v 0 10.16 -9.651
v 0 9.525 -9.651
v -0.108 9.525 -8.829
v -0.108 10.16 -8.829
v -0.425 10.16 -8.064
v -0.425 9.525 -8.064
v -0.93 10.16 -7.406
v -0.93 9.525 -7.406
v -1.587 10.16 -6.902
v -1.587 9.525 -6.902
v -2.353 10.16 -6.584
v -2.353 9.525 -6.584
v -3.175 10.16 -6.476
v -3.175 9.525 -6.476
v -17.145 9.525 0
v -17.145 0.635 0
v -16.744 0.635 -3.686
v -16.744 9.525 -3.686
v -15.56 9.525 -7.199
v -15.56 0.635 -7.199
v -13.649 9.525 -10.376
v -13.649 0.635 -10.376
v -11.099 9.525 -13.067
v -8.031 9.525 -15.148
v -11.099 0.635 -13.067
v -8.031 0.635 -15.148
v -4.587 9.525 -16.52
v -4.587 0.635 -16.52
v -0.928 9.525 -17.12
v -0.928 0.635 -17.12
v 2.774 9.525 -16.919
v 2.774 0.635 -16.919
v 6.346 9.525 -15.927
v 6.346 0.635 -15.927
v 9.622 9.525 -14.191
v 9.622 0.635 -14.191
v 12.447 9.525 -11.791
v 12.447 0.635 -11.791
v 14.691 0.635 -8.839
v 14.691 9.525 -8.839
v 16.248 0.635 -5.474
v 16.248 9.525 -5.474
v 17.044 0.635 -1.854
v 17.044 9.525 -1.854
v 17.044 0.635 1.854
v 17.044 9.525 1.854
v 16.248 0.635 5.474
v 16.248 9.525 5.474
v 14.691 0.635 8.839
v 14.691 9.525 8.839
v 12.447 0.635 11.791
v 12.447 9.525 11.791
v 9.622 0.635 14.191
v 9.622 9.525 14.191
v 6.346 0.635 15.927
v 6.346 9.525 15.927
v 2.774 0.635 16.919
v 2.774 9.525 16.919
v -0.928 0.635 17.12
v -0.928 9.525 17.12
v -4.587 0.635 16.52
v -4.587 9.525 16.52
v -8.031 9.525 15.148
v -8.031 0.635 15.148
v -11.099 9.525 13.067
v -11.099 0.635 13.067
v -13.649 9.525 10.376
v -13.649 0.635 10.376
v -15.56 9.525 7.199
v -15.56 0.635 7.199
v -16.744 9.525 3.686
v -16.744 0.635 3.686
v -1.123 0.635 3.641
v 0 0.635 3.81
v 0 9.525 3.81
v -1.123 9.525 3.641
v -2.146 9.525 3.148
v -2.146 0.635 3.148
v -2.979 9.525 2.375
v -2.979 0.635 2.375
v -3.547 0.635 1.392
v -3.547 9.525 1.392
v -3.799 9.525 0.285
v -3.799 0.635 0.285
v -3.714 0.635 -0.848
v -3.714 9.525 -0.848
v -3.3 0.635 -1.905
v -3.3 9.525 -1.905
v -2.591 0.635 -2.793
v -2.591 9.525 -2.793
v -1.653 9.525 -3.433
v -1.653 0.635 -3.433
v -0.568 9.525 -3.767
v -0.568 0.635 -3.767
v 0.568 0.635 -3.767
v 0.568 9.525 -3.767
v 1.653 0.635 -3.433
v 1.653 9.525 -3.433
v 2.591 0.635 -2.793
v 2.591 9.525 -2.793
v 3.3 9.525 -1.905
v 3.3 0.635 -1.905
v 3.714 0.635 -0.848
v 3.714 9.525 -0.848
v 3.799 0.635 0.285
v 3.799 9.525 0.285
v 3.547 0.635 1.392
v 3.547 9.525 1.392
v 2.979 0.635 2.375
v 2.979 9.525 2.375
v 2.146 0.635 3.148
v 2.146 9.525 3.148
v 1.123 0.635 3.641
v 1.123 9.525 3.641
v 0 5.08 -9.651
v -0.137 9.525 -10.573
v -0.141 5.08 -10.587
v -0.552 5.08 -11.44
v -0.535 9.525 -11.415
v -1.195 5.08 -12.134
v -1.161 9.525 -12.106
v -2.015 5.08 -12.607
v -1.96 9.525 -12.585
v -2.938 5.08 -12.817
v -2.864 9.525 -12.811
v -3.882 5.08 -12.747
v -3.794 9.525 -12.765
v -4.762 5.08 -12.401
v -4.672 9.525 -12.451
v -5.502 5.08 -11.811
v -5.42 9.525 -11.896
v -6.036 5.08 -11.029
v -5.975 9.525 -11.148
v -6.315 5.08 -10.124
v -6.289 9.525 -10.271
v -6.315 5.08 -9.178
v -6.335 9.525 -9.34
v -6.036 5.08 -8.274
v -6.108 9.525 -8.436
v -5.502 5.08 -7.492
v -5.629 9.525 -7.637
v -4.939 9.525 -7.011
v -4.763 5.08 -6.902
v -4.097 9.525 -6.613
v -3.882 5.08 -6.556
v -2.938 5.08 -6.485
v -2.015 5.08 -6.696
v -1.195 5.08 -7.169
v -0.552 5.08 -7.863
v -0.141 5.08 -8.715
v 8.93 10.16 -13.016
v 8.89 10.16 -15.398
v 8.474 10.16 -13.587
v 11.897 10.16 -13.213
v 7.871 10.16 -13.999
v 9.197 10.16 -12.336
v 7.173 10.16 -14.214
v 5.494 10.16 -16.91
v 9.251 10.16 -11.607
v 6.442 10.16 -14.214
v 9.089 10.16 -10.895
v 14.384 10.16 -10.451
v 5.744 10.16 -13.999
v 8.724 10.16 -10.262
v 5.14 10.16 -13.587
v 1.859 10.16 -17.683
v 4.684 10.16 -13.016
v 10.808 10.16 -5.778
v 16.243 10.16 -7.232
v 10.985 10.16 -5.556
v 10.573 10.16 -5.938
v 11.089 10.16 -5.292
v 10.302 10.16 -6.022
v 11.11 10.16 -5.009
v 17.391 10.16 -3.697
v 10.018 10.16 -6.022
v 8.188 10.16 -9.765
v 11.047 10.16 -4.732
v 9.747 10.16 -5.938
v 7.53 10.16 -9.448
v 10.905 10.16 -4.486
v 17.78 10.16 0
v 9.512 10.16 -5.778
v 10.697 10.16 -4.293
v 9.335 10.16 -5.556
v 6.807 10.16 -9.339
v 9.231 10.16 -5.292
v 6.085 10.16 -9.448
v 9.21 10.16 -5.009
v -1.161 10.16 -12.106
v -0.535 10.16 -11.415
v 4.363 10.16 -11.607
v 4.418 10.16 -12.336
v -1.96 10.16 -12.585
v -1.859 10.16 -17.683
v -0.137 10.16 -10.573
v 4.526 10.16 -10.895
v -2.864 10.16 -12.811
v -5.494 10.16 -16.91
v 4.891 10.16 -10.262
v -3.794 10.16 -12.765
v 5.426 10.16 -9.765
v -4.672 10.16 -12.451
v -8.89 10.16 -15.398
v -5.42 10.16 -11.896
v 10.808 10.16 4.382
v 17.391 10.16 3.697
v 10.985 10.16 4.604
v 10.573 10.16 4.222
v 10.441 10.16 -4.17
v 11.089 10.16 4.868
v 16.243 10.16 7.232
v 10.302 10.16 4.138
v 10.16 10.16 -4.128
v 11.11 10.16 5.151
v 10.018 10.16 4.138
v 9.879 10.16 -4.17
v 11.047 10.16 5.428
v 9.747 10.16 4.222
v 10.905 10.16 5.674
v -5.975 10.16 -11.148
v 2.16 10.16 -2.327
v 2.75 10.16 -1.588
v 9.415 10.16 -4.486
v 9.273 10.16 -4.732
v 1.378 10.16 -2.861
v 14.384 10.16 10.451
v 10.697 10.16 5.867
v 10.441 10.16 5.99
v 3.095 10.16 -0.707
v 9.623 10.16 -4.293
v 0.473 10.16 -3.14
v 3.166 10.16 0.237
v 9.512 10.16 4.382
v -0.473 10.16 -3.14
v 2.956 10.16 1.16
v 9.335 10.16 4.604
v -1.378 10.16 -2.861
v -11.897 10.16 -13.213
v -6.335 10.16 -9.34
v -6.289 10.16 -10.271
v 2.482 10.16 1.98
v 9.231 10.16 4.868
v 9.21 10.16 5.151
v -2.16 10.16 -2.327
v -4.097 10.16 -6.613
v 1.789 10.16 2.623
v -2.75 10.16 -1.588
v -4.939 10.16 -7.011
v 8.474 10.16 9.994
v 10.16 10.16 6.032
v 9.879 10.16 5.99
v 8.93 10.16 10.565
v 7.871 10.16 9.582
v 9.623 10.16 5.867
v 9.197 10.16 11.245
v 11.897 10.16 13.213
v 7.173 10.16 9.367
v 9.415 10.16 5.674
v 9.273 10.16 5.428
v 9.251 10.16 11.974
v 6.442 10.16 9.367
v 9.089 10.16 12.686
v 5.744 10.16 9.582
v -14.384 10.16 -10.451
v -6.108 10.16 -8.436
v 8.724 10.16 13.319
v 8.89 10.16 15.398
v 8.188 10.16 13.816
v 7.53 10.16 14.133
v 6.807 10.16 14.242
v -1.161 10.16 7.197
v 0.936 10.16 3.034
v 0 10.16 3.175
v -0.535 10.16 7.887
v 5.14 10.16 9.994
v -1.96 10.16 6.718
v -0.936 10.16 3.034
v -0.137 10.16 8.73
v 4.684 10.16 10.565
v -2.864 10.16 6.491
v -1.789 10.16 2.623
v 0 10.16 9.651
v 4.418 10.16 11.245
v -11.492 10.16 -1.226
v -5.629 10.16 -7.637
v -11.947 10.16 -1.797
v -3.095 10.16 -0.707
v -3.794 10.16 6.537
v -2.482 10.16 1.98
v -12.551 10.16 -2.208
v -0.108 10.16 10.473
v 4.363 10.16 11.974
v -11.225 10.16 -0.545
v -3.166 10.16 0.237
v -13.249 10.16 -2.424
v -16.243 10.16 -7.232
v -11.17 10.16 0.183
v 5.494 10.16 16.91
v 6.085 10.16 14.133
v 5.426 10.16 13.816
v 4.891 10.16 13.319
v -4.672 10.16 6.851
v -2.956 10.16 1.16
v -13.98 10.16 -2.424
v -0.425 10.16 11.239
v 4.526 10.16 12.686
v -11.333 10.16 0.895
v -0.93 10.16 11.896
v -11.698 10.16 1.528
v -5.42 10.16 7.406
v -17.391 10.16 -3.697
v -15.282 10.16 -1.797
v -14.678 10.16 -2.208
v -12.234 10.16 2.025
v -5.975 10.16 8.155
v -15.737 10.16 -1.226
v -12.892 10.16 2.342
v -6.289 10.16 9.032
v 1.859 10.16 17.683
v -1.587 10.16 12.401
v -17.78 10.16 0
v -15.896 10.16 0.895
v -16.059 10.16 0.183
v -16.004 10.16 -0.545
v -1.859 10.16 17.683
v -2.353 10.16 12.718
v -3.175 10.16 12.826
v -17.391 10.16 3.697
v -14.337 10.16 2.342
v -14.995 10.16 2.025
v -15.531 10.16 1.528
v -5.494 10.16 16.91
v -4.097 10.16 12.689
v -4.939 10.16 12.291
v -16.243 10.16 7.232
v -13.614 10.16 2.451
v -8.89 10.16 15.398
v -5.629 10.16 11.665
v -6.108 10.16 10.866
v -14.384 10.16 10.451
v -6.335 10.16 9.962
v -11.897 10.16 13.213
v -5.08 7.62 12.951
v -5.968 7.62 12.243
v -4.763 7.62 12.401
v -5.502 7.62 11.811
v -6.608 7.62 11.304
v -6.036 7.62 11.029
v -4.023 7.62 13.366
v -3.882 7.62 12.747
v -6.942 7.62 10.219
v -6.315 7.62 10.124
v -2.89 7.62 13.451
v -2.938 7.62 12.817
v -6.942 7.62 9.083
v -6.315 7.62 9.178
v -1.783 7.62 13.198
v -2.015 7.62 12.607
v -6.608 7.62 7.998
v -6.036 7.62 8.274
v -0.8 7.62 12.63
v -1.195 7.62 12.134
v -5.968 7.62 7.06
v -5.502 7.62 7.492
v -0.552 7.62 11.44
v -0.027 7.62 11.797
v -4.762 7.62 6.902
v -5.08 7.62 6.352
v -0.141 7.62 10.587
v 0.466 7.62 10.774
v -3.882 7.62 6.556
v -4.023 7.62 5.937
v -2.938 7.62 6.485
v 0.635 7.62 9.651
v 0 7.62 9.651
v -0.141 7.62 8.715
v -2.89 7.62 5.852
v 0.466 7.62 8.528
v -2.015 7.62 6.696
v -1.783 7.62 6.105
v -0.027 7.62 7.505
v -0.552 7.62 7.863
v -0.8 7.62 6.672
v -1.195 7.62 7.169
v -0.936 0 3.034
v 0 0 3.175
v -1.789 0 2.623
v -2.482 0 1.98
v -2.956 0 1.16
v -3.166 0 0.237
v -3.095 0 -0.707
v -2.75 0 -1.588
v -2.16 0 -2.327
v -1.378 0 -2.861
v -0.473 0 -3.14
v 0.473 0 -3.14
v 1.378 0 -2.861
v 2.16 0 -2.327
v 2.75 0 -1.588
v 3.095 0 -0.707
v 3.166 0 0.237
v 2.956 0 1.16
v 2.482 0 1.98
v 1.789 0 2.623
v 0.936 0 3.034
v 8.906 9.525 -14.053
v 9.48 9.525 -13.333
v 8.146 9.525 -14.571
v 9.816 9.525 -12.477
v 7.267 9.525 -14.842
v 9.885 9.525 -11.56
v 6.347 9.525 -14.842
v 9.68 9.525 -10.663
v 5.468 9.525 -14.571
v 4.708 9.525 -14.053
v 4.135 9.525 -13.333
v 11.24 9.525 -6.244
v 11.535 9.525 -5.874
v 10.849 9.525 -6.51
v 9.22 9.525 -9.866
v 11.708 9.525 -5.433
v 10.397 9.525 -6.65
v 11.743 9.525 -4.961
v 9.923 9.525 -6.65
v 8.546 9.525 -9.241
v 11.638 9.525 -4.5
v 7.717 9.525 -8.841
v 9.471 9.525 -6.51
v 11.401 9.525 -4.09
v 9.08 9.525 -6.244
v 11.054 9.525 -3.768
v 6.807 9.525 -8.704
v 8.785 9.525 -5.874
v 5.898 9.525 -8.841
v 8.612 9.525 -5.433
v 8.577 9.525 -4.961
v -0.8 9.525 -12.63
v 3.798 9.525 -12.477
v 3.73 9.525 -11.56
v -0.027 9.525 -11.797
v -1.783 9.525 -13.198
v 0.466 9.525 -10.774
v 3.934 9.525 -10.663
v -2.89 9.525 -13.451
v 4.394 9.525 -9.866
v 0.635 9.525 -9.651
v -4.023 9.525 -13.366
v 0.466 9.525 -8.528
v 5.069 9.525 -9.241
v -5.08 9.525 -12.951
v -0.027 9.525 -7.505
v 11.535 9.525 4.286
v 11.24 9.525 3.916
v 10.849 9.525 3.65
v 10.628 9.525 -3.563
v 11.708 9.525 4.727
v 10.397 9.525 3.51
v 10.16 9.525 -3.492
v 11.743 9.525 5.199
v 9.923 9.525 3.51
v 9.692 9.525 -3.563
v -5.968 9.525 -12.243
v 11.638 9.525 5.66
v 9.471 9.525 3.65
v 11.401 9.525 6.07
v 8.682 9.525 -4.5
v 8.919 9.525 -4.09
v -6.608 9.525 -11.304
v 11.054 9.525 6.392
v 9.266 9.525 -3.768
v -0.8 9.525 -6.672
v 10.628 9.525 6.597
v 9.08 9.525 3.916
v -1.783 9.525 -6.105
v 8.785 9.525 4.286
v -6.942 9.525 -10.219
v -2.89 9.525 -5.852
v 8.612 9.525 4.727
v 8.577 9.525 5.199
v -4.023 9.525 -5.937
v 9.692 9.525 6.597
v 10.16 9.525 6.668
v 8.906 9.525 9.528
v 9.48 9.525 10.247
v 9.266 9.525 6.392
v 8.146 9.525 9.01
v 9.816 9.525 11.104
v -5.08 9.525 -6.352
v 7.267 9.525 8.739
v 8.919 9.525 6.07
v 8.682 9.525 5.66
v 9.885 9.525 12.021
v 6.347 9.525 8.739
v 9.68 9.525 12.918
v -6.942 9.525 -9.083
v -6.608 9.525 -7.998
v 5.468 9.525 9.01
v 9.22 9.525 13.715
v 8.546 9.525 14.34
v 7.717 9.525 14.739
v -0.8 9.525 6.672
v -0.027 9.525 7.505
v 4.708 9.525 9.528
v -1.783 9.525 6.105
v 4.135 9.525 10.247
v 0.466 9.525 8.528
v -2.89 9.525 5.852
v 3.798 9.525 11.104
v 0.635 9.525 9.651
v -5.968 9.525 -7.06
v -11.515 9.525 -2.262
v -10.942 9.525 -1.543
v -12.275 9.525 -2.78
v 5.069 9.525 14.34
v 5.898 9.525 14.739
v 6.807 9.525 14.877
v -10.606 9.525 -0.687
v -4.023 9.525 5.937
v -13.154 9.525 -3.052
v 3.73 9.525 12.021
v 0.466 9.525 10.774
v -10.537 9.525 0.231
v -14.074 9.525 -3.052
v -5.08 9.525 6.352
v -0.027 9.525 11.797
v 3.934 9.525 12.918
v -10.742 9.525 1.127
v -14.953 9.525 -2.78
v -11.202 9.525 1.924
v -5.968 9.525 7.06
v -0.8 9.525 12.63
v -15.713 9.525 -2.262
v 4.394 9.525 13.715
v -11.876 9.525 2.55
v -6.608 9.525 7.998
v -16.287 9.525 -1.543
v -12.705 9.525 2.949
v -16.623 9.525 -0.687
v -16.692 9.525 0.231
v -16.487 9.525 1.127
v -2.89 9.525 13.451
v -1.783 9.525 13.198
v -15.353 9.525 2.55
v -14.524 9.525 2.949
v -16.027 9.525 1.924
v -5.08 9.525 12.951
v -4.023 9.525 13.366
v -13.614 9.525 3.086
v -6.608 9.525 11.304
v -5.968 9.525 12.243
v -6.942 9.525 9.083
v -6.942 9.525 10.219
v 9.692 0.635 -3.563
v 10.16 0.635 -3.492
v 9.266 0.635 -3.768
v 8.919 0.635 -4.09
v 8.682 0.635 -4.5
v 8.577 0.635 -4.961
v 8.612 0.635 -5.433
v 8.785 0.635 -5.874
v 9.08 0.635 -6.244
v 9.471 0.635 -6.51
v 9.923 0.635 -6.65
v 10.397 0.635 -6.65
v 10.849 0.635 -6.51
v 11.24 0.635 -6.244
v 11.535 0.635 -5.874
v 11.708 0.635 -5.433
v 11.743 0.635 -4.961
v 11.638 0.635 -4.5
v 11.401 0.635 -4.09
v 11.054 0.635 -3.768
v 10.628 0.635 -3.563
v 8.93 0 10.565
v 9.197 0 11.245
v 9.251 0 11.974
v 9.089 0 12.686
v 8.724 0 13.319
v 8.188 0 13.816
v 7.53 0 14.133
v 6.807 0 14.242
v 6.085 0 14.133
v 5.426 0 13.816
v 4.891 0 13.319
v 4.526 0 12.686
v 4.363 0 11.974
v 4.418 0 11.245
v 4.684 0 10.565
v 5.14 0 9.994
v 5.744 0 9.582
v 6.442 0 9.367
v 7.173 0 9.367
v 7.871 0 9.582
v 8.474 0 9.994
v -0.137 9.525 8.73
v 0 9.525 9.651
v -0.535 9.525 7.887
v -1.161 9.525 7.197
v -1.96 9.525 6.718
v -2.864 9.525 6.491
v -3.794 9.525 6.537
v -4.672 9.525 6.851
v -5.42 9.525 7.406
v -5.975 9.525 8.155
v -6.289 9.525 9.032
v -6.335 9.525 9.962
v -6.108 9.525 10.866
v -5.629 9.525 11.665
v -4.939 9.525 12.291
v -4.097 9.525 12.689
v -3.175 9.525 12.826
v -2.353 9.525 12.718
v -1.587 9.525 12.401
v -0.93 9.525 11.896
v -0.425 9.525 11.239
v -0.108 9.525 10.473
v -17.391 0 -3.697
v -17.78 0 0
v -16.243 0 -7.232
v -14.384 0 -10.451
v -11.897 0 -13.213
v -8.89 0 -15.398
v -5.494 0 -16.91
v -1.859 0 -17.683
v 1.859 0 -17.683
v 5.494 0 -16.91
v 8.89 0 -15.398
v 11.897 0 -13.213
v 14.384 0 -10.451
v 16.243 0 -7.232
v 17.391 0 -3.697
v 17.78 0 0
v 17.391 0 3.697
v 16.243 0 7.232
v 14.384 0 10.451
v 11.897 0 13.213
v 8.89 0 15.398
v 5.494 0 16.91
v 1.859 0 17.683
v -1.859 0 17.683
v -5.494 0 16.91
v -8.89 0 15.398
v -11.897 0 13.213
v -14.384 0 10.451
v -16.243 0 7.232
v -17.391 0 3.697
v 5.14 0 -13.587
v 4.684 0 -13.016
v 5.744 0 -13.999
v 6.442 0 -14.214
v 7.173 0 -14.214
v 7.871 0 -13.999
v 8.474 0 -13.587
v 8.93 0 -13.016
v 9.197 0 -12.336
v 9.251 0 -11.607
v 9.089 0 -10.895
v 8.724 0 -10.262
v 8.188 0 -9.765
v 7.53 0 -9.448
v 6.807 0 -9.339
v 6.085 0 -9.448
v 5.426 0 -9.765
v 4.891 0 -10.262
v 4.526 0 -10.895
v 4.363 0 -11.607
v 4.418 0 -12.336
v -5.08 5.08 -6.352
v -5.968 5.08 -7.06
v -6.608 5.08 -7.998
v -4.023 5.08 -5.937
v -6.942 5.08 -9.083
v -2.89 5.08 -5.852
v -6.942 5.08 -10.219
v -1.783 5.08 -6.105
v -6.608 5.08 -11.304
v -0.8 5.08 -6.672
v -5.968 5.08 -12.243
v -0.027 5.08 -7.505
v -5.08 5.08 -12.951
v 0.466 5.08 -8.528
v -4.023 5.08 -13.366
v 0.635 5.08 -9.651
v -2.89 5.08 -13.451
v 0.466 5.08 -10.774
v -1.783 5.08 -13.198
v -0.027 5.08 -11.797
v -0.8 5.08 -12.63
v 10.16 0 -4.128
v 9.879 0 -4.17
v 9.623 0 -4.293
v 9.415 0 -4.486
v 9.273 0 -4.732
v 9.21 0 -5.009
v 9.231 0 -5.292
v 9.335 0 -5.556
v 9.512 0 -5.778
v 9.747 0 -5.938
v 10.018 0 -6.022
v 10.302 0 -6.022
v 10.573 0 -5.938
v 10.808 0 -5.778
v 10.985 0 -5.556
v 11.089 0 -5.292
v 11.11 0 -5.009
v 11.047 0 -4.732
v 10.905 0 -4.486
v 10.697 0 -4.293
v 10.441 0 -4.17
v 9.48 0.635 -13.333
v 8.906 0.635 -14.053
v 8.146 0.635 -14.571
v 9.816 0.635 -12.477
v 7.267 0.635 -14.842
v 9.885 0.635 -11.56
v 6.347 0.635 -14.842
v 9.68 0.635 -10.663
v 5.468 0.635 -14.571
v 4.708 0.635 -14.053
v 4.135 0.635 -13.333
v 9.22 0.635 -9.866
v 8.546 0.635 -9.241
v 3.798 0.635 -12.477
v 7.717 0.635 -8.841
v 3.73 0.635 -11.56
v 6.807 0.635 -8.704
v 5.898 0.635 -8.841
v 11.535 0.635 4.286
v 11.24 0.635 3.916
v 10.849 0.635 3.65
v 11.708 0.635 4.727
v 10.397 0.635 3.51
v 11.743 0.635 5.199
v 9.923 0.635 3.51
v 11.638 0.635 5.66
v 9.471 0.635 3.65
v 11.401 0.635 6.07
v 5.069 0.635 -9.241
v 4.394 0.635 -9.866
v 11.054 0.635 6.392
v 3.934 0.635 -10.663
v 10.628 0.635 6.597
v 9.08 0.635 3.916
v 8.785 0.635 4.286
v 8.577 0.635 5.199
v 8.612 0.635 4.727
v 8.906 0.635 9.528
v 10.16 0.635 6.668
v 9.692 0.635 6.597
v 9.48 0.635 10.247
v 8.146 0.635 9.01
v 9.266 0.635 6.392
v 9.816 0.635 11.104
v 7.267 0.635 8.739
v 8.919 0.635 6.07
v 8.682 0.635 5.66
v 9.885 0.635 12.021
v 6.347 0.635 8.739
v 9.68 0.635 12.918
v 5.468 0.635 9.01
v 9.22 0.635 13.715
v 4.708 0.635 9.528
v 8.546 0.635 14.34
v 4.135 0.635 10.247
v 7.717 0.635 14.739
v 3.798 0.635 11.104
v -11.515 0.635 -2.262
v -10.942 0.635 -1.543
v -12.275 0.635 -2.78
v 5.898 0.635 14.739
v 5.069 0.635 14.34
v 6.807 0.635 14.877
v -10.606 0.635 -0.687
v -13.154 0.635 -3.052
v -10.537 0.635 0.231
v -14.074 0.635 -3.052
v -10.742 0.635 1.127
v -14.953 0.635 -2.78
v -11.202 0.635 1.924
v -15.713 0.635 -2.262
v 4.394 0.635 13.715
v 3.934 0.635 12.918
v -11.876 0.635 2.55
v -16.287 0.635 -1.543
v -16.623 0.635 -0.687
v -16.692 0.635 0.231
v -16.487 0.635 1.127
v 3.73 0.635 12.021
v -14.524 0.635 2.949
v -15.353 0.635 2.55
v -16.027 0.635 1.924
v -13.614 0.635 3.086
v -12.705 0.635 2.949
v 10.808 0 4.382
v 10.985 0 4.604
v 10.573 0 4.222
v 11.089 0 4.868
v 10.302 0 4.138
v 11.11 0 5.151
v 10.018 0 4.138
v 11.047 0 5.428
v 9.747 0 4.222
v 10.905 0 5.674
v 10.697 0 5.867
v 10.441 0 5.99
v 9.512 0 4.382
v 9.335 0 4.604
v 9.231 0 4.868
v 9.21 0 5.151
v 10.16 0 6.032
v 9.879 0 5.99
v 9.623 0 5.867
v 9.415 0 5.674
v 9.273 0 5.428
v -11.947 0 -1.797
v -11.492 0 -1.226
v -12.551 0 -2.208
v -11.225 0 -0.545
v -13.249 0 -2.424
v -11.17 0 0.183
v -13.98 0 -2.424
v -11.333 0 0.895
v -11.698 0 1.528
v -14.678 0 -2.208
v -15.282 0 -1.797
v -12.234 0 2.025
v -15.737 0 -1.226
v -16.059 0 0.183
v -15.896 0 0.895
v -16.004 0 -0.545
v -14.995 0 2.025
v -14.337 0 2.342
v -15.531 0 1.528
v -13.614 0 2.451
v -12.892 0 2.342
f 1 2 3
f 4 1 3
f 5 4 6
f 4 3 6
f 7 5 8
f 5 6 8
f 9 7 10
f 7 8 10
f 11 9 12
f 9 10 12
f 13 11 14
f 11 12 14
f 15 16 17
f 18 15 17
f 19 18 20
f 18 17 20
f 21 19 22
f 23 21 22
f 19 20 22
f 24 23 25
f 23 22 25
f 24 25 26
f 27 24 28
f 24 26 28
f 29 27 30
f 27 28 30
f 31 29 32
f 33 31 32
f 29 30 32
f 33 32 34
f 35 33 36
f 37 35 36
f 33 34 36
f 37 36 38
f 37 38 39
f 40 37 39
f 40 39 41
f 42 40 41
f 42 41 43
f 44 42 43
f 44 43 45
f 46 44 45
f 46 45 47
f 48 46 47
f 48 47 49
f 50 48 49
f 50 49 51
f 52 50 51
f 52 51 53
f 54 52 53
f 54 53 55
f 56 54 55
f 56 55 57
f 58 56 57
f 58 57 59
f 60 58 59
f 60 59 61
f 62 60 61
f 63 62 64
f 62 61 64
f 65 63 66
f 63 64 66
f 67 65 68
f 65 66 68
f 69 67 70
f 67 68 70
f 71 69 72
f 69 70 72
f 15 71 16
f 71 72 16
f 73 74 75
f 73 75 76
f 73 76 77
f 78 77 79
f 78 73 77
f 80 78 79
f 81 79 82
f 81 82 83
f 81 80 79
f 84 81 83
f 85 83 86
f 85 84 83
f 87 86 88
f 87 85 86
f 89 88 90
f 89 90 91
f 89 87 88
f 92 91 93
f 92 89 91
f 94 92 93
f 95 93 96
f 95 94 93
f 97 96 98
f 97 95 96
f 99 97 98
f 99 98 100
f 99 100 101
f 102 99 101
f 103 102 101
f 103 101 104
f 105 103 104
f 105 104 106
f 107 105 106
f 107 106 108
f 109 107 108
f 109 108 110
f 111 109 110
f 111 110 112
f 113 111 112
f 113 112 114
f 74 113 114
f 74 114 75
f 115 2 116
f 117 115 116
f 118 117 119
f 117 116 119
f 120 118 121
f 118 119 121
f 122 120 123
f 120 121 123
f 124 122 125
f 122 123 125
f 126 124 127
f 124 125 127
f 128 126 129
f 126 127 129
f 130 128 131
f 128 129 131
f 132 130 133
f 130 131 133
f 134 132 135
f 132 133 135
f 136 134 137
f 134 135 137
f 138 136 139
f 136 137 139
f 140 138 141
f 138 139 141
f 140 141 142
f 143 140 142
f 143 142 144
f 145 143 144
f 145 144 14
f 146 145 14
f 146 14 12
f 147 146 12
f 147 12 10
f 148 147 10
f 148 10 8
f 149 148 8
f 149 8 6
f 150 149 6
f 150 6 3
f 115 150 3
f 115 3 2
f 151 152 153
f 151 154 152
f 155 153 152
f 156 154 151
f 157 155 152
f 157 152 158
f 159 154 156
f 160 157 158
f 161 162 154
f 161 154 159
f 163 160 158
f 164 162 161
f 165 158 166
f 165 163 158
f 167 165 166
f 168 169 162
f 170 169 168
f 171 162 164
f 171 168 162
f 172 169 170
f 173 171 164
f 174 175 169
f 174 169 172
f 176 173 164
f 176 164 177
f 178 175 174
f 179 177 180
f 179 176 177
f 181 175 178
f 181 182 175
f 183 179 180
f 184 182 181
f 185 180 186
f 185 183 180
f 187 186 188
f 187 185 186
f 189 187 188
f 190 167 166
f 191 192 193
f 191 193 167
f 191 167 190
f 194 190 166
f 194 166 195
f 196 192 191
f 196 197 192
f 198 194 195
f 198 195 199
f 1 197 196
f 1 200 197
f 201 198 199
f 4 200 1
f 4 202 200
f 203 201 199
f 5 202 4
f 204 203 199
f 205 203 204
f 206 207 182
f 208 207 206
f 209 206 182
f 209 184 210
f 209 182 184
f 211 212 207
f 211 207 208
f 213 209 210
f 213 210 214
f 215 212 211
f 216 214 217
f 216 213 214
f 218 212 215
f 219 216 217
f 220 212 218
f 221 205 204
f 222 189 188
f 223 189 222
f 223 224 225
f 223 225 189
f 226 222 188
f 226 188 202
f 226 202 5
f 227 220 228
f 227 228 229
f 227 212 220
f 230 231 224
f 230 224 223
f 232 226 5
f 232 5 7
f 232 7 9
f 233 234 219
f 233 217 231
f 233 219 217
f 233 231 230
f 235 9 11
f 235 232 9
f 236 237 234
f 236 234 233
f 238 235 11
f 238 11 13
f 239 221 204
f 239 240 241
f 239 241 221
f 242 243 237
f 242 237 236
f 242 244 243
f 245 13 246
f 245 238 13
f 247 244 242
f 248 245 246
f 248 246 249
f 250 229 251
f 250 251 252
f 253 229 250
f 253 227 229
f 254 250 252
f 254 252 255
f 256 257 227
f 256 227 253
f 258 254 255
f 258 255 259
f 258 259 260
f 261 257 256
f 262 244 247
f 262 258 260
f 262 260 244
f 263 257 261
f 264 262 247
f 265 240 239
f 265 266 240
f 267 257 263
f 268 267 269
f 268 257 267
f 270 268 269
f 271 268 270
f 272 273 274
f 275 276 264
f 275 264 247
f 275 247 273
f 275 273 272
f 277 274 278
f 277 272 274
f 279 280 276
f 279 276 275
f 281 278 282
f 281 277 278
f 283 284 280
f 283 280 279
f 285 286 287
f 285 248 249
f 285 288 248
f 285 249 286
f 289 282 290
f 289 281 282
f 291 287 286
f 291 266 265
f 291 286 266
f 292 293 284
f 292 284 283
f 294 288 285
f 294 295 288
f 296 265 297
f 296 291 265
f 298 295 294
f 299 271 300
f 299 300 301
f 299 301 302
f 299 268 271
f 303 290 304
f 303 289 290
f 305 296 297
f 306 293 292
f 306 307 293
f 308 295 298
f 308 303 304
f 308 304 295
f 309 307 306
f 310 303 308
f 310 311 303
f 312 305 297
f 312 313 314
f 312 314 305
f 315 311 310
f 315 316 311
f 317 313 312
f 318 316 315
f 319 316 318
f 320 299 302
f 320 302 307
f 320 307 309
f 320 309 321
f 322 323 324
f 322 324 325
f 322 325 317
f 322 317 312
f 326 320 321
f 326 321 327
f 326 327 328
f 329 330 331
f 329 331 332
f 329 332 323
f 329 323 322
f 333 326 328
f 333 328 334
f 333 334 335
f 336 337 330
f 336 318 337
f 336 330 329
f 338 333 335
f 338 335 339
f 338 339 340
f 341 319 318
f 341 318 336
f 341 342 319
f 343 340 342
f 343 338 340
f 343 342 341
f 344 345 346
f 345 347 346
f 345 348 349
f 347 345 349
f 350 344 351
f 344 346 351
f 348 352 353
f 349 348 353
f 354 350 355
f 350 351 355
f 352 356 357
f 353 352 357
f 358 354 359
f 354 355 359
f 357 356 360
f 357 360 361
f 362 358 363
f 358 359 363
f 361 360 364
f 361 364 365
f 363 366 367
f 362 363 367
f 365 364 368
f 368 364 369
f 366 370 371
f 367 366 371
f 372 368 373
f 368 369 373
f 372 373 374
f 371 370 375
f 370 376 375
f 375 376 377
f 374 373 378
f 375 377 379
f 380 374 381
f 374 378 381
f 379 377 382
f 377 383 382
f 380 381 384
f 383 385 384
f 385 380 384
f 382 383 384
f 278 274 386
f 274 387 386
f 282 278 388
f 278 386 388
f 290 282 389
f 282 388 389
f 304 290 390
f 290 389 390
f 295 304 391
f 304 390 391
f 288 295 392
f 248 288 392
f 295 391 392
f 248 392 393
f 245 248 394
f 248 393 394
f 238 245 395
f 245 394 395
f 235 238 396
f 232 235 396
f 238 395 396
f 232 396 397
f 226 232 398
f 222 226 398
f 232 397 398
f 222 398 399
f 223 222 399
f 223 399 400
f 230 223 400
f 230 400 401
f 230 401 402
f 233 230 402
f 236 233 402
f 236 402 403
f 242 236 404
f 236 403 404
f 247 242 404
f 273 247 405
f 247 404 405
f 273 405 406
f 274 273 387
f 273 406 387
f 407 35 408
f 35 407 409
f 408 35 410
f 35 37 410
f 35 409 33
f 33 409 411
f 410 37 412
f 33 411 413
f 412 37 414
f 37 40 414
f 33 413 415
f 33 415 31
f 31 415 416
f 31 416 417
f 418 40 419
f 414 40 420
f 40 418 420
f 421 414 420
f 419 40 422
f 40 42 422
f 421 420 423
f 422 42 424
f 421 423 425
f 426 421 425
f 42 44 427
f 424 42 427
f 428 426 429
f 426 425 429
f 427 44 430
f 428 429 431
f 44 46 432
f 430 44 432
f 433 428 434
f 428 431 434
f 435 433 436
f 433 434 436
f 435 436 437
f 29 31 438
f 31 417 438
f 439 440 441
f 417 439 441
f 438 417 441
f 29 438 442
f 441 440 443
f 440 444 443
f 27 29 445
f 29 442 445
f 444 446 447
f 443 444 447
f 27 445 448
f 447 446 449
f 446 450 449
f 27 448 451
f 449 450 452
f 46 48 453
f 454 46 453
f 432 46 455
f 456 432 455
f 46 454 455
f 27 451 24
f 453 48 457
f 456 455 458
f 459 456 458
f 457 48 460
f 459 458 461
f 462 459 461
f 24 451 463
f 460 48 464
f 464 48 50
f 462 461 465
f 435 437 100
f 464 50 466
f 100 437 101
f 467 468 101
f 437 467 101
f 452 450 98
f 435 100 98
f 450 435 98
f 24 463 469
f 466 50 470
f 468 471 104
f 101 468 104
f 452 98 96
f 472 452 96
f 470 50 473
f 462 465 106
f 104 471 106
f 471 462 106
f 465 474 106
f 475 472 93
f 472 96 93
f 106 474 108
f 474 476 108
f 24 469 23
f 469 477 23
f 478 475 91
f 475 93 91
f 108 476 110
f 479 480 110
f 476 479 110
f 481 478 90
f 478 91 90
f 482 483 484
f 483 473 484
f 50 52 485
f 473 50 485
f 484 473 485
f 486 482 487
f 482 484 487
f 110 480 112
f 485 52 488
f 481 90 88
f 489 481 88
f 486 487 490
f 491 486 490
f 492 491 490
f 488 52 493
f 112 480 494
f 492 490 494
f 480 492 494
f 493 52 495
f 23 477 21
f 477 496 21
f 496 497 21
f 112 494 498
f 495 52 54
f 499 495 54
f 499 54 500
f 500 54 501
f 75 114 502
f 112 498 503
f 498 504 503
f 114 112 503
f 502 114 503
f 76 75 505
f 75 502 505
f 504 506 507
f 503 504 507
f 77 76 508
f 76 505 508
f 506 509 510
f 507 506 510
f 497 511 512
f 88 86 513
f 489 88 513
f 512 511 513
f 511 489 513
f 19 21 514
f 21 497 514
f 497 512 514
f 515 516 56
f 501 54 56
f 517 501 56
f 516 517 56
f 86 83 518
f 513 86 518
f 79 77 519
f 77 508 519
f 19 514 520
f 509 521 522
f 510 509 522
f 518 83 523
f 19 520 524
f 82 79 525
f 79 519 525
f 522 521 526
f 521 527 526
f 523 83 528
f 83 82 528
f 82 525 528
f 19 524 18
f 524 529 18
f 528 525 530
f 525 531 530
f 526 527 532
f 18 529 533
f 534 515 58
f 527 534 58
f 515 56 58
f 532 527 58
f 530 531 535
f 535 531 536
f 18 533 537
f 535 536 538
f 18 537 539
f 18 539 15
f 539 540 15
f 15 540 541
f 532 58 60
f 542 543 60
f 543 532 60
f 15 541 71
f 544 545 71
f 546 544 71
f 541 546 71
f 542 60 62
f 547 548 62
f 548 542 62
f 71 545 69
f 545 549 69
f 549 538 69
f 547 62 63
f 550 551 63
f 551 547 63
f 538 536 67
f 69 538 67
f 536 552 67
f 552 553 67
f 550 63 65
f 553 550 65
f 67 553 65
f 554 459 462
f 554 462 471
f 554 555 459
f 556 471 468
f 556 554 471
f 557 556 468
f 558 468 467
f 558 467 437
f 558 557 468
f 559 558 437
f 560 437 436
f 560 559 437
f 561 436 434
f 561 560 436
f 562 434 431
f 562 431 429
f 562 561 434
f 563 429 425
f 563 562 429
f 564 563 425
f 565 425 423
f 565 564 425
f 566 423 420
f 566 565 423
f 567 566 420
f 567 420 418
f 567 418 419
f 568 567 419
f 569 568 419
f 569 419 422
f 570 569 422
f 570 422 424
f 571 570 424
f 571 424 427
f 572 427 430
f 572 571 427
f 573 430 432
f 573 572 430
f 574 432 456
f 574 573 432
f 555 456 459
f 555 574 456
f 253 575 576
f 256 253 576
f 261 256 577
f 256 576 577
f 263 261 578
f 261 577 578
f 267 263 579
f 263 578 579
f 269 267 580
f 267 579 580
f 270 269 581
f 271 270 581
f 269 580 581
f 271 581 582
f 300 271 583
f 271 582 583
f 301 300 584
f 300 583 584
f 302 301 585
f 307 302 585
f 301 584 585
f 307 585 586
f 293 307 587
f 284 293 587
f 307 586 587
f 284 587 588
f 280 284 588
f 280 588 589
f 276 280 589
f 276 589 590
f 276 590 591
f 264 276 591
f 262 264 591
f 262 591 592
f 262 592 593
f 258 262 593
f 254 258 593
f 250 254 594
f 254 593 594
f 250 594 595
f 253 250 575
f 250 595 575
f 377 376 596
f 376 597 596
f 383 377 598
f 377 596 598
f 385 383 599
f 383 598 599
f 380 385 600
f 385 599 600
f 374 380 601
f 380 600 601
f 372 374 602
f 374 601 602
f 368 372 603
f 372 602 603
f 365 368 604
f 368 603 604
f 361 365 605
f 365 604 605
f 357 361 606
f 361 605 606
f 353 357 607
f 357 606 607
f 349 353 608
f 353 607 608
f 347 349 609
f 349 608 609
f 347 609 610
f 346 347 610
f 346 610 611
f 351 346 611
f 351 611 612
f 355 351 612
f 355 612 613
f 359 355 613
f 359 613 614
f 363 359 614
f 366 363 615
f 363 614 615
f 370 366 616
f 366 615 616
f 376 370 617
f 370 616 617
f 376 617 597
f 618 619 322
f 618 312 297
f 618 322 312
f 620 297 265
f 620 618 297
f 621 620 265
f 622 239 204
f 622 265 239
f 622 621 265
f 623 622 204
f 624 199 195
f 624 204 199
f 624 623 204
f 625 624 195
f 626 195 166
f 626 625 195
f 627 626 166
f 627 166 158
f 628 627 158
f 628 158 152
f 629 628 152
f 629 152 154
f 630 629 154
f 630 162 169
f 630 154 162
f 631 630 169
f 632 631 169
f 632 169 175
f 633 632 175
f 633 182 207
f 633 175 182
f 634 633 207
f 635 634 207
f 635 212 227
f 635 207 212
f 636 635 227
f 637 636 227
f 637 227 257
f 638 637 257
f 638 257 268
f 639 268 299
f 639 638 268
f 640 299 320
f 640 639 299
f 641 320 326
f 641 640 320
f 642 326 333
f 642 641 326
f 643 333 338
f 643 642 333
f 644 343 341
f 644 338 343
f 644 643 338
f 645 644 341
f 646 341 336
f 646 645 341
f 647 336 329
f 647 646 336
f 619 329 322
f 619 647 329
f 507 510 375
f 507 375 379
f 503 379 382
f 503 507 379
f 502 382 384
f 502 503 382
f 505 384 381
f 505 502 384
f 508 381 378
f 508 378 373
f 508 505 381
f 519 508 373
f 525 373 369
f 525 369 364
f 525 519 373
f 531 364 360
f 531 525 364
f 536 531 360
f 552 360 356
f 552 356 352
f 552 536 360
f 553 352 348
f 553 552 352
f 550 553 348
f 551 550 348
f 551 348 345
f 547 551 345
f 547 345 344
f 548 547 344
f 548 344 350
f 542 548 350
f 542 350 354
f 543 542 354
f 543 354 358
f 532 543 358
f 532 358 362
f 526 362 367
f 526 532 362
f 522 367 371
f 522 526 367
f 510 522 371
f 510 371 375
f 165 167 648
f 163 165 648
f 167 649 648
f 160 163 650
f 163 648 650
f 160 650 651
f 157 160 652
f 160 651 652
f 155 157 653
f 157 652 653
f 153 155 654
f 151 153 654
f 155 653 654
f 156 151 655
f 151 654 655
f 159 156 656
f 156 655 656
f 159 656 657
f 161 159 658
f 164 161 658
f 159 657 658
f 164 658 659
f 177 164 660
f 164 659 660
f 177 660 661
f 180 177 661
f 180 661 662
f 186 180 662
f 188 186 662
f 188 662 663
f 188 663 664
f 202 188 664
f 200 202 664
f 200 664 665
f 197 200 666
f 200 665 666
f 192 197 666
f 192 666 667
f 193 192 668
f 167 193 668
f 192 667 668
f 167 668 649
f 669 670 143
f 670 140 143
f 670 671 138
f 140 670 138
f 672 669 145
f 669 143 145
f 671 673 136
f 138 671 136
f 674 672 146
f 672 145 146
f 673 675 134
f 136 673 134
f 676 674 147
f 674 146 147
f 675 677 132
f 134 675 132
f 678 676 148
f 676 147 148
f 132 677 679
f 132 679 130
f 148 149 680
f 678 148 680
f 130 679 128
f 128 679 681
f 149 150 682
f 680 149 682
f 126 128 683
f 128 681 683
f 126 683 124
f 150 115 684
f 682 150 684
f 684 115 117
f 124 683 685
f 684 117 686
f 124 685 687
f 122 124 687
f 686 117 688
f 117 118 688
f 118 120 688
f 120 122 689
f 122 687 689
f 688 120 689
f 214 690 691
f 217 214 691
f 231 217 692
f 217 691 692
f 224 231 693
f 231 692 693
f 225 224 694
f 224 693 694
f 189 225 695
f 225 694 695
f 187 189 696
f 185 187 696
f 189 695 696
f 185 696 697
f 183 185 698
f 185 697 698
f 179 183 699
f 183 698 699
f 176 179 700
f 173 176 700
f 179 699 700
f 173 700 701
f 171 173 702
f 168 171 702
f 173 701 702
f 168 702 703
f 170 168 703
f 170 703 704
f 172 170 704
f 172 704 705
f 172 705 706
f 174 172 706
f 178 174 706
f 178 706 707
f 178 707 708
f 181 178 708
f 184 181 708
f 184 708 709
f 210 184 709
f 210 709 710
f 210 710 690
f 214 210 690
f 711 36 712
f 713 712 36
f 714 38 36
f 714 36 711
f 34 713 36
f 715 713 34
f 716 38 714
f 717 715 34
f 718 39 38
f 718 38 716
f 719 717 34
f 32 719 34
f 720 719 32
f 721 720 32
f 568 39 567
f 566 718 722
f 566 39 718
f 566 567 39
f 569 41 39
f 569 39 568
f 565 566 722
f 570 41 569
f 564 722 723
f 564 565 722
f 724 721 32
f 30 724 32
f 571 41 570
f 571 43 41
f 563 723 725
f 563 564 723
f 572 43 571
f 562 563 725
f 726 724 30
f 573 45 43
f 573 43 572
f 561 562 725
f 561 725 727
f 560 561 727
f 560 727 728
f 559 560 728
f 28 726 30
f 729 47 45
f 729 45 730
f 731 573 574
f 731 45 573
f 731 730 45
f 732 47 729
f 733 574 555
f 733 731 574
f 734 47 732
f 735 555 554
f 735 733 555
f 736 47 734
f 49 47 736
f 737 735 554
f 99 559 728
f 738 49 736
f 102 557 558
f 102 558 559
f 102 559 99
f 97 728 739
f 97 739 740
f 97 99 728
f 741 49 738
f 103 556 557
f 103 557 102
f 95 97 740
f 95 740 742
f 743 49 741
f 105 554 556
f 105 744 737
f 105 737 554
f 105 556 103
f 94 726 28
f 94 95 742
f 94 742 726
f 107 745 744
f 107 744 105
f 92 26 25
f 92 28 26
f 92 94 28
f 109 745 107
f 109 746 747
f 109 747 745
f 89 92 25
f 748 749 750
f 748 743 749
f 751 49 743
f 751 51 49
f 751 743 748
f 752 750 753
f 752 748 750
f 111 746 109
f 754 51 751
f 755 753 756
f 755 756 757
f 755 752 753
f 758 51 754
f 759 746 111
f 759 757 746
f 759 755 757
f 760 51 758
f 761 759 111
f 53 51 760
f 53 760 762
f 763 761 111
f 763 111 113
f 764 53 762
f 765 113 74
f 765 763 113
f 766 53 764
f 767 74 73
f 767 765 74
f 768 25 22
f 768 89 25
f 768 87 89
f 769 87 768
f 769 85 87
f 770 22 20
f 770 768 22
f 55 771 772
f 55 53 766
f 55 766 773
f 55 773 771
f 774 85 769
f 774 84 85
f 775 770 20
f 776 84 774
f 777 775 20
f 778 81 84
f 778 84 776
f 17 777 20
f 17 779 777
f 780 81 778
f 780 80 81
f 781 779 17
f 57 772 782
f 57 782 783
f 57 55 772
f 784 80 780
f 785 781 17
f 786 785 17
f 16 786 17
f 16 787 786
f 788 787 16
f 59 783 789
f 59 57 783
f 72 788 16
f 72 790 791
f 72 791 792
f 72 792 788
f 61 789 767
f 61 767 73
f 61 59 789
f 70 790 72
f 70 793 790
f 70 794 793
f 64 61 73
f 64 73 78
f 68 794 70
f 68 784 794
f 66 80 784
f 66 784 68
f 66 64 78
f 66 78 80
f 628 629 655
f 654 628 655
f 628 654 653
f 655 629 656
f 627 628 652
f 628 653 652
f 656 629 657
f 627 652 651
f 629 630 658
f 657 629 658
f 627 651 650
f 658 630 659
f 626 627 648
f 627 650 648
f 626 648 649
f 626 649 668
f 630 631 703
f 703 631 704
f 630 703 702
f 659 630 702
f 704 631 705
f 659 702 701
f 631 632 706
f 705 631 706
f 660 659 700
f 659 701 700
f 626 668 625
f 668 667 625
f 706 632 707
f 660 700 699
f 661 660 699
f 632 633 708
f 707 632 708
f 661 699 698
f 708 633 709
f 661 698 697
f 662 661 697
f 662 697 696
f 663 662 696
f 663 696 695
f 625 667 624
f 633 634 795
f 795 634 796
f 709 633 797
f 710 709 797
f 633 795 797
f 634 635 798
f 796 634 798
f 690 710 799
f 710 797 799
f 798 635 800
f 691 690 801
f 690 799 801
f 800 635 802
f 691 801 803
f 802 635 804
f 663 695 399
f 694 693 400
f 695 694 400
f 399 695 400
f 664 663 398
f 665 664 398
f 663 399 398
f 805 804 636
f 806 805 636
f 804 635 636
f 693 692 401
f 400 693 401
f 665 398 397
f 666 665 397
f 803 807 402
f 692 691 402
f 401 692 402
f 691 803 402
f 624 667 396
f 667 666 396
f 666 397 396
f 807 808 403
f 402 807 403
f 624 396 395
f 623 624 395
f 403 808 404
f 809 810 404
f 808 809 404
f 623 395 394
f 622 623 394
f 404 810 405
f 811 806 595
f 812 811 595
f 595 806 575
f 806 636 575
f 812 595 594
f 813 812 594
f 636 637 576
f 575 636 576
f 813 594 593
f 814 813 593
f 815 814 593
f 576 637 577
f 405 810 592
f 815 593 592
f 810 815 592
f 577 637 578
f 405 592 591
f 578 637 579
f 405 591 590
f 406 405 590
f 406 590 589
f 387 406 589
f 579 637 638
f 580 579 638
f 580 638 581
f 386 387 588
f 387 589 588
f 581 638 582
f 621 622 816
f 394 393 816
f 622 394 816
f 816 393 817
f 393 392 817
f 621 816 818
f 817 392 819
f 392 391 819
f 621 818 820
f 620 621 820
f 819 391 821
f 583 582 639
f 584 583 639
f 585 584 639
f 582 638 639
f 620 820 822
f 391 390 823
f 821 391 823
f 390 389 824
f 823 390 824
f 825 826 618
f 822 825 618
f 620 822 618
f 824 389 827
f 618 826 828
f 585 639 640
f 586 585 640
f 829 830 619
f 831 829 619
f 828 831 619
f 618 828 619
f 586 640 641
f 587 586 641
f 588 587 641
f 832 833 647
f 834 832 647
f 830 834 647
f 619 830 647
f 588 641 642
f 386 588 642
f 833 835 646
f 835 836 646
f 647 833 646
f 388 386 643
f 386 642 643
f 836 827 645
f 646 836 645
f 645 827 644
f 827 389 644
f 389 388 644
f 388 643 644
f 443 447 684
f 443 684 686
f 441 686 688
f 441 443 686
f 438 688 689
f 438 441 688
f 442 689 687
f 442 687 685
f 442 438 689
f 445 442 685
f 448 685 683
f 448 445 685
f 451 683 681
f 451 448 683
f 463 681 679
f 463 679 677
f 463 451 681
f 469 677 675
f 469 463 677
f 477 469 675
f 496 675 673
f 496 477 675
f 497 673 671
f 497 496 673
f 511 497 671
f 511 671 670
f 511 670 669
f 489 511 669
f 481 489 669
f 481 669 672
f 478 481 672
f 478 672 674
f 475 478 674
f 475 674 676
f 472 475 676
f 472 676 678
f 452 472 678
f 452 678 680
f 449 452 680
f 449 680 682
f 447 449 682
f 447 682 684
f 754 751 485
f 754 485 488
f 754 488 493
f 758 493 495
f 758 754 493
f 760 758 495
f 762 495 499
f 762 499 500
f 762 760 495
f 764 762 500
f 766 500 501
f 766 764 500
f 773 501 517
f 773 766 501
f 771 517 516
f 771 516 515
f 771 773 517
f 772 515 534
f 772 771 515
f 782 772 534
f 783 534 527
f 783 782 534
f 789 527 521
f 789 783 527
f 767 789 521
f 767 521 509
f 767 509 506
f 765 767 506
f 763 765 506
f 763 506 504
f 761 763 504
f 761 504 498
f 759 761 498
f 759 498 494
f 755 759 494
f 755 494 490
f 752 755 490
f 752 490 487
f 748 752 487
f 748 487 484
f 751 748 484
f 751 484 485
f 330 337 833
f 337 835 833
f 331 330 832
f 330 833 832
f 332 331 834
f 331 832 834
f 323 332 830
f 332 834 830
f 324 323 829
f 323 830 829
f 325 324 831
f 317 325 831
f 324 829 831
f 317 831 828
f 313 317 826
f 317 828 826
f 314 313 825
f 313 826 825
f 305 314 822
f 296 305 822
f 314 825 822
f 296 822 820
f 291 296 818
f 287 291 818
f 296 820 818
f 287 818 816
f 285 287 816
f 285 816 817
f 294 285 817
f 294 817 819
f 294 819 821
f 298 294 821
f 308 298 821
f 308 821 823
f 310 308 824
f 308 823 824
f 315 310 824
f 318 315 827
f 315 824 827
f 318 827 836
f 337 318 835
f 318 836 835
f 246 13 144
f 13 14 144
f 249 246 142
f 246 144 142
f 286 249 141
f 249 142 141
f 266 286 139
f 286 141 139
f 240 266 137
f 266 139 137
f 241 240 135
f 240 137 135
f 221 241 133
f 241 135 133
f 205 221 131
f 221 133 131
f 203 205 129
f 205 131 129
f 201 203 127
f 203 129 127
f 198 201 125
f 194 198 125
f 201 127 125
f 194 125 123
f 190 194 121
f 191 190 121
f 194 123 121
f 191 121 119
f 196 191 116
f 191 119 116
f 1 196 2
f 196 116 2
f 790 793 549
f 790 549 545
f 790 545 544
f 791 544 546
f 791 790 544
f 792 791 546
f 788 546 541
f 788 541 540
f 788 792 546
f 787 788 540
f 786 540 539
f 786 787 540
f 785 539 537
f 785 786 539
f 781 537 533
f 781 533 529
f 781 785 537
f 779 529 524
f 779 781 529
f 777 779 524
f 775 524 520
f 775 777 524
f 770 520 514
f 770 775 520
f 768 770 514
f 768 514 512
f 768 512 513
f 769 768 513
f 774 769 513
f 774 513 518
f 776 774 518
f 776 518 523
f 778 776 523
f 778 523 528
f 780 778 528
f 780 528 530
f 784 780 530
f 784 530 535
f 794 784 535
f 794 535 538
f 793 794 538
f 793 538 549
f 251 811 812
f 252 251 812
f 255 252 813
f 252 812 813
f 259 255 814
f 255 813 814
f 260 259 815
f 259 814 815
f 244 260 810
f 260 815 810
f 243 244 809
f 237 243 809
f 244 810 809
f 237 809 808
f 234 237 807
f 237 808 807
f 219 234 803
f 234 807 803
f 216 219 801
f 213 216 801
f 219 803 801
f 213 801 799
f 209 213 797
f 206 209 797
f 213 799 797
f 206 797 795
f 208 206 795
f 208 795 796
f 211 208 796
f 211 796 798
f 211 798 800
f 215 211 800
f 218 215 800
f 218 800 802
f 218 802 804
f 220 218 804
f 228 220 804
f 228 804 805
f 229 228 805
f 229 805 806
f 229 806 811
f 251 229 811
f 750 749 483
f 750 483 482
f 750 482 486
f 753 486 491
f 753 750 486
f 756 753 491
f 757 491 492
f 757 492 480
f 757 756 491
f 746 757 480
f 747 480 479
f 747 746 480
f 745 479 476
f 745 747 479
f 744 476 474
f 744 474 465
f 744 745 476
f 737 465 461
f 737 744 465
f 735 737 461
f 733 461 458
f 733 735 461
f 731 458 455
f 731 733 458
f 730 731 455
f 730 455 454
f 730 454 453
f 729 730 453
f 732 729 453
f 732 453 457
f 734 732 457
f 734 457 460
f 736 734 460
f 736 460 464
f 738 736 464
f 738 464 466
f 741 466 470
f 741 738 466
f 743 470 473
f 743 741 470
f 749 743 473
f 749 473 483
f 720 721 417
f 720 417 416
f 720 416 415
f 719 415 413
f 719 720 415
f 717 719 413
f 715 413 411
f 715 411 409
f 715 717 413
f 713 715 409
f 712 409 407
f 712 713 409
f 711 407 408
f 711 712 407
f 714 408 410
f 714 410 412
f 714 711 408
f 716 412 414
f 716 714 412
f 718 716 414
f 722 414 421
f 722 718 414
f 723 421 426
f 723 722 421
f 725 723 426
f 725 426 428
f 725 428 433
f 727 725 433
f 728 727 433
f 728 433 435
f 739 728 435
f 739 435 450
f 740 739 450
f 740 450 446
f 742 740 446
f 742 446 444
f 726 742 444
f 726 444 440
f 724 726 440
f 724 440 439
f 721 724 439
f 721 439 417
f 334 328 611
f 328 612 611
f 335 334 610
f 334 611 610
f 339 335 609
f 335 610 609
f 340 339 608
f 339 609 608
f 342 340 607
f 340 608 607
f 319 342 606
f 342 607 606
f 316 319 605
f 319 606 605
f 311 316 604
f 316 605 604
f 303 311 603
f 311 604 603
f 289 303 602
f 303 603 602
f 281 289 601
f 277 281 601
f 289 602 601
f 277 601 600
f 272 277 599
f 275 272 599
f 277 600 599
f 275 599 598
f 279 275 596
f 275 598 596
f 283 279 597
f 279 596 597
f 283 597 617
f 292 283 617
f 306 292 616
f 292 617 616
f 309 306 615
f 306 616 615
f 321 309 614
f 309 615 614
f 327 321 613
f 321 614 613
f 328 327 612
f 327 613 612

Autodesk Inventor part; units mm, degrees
ref_plane "YZ Plane" through (0, 0, 0) normal (1, 0, 0) x (0, 1, 0)
ref_plane "XZ Plane" through (0, 0, 0) normal (0, 1, 0) x (-1, 0, 0)
ref_plane "XY Plane" through (0, 0, 0) normal (0, 0, 1) x (1, 0, 0)
sketch "Sketch1" plane through (0, 0, 0) normal (0, 1, 0) x (-1, 0, 0)
  circle A0 centre (0, 0) radius 17.78
  dimension "d0" = 35.56
extrude "Extrusion1" add sketch "Sketch1" along normal blind 10.16
sketch "Sketch2" plane through (0, 10.16, 0) normal (0, 1, 0) x (1, 0, 0)
  circle A0 centre (0, 0) radius 17.78 projected
hole "Hole1" at (0, 10.16, 0) direction (0, -1, 0) diameter 6.35 end through all
sketch "Sketch3" plane through (0, 10.16, 0) normal (0, 1, 0) x (1, 0, 0)
  line L0 (0, 0) -> (-13.6144, 0)
  dimension "d10" = 13.6144
hole "Hole2" at (-13.6144, 10.16, 0) direction (0, -1, 0) diameter 4.9022 end through all
pattern_circular "Circular Pattern1" count 3 over 360 about axis through (0, -41.1455, 0) along (0, 1, 0) of "Hole2"
sketch "Sketch23" plane through (0, 10.16, 0) normal (0, 1, 0) x (1, 0, 0)
  line L0 (0, 0) -> (10.16, 0)
  line L1 (10.16, 0) -> (10.16, 5.08)
  line L2 (10.16, 5.08) -> (10.16, -5.08)
  dimension "d122" = 10.16
  dimension "d123" = 5.08
  dimension "d124" = 10.16
hole "Hole10" at (10.16, 10.16, -5.08) at (10.16, 10.16, 5.08) direction (0, -1, 0) diameter 1.905 end through all
shell "Shell4" thickness 0.635 removed faces 0
sketch "Sketch26" plane through (0, 10.16, 0) normal (0, 1, 0) x (1, 0, 0)
  line L0 (0, 0) -> (-3.175, 9.6512)
  line L1 (-3.175, 9.6512) -> (0, 0)
  line L2 (0, 0) -> (-3.175, -9.6512)
  dimension "d148" = 10.16
  dimension "d149" = 10.16
hole "Hole12" at (-3.175, 10.16, -9.6512) at (-3.175, 10.16, 9.6512) direction (0, -1, 0) diameter 6.35 depth 2.54
sketch "Sketch27" plane through (0, 10.16, 0) normal (0, 1, 0) x (1, 0, 0)
  circle A0 centre (-3.175, 9.6512) radius 3.175 projected
  circle A1 centre (-3.175, 9.6512) radius 3.81
  circle A2 centre (-3.175, -9.6512) radius 3.175 projected
  circle A3 centre (-3.175, -9.6512) radius 3.81
  point P0 (0, 0)
  dimension "d157" = 7.62
  dimension "d158" = 7.62
extrude "Extrusion15" add sketch "Sketch27" against normal blind 5.08 contours A1
extrude "Extrusion16" add sketch "Sketch27" against normal blind 2.54 contours A3
sketch "Sketch28" plane through (0, 10.16, 0) normal (0, 1, 0) x (1, 0, 0)
  point P0 (0, 0)
properties part number "water"
